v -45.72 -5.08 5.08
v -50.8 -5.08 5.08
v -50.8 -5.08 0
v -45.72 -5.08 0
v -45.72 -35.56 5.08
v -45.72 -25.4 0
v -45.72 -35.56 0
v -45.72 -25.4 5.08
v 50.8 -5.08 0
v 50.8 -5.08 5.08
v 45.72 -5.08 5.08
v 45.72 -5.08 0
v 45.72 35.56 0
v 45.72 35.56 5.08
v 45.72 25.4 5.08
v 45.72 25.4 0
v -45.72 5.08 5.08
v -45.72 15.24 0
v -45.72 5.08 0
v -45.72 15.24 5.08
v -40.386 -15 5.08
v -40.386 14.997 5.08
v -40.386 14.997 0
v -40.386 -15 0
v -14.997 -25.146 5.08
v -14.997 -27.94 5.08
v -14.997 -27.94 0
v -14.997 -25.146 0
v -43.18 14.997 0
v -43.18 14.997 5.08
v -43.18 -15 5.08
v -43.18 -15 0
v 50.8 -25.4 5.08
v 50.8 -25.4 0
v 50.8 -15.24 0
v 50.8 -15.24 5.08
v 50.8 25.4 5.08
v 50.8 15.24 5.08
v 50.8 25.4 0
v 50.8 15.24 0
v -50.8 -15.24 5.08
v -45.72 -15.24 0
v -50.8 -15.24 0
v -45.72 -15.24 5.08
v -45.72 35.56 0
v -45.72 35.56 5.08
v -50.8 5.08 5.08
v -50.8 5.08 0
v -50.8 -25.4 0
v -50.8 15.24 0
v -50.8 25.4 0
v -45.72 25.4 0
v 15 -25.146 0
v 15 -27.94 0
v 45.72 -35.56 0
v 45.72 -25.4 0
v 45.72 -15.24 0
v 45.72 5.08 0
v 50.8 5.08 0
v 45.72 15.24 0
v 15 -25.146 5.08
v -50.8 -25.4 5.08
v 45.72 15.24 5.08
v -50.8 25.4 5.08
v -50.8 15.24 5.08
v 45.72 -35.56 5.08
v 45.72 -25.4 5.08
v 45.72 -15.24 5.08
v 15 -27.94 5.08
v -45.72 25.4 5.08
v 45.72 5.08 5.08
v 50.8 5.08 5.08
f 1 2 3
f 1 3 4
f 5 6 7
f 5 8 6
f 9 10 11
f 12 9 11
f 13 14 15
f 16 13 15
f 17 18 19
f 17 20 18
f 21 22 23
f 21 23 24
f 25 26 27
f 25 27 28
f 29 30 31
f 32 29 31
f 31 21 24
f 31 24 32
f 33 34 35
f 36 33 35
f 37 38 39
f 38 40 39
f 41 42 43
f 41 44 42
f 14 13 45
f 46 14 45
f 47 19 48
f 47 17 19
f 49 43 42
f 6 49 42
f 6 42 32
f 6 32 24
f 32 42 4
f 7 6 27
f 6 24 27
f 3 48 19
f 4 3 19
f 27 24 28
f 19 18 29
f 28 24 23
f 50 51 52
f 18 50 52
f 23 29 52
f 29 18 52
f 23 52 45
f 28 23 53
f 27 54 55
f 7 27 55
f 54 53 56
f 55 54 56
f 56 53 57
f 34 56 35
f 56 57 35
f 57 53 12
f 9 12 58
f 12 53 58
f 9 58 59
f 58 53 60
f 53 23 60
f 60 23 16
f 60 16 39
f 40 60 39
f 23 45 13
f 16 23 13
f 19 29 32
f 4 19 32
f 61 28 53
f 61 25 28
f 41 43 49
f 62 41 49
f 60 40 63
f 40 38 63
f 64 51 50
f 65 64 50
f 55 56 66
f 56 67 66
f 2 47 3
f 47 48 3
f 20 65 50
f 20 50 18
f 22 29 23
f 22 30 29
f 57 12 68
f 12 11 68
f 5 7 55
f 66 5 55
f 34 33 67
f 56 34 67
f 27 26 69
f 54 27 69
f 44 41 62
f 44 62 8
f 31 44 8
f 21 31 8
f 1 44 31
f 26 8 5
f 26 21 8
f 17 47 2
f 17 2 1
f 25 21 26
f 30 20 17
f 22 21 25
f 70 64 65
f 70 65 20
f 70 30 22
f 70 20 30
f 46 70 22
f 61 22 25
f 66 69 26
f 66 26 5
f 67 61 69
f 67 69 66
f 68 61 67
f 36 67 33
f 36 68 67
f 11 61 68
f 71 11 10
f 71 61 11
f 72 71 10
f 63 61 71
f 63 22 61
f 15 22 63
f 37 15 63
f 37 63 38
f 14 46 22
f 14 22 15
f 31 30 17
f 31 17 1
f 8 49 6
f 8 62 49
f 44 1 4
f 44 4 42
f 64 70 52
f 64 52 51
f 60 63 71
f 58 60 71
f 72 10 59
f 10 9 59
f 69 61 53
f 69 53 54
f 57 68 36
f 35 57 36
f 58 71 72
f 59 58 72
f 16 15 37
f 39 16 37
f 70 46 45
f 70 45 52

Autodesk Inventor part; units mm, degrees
ref_plane "YZ Plane" through (0, 0, 0) normal (1, 0, 0) x (0, 1, 0)
ref_plane "XZ Plane" through (0, 0, 0) normal (0, 1, 0) x (-1, 0, 0)
ref_plane "XY Plane" through (0, 0, 0) normal (0, 0, 1) x (1, 0, 0)
sketch "Sketch1" plane through (0, 0, 0) normal (0, 0, 1) x (1, 0, 0)
  line L0 (-50.8, -35.56) -> (50.8, -35.56)
  line L1 (50.8, -35.56) -> (50.8, 35.56)
  line L2 (50.8, 35.56) -> (-50.8, 35.56)
  line L3 (-50.8, 35.56) -> (-50.8, -35.56)
  line L4 (-50.8, 35.56) -> (50.8, -35.56) construction
  line L5 (50.8, -35.56) -> (-50.8, -35.56) construction
  line L6 (50.8, 35.56) -> (-50.8, -35.56) construction
  point P0 (0, 0)
  point P1 (0, 0)
  dimension "d0" = 101.6
  dimension "d1" = 71.12
extrude "Extrusion1" add sketch "Sketch1" along normal blind 5.08
sketch "Sketch2" plane through (0, 0, 5.08) normal (0, 0, 1) x (1, 0, 0)
  line L0 (-43.18, 16.9024) -> (-43.18, -16.905) projected
  line L1 (-40.386, 16.9024) -> (-40.386, -16.905) projected
  line L2 (-16.9024, -27.94) -> (16.905, -27.94) projected
  line L3 (-16.9024, -25.146) -> (16.905, -25.146) projected
  line L4 (-40.386, -16.905) -> (-43.18, -16.905) projected
  line L5 (-43.18, 16.9024) -> (-40.386, 16.9024) projected
  line L6 (16.905, -25.146) -> (16.905, -27.94) projected
  line L7 (-16.9024, -27.94) -> (-16.9024, -25.146) projected
  point P0 (0, 0)
extrude "Extrusion2" cut sketch "Sketch2" against normal blind 5.08
sketch "Sketch3" plane through (0, 0, 5.08) normal (0, 0, 1) x (1, 0, 0)
  line L0 (-43.18, -16.905) -> (-43.18, 16.9024) projected
  line L1 (-40.386, 16.9024) -> (-40.386, -16.905) projected
  line L2 (16.905, -27.94) -> (-16.9024, -27.94) projected
  line L3 (-16.9024, -25.146) -> (16.905, -25.146) projected
  line L4 (50.8, -35.56) -> (50.8, 35.56) projected
  line L5 (50.8, 35.56) -> (-50.8, 35.56) projected
  line L6 (-50.8, 35.56) -> (-50.8, -35.56) projected
  line L7 (-50.8, -35.56) -> (50.8, -35.56) projected
  line L8 (50.8, -35.56) -> (50.8, 35.56) projected
  line L9 (50.8, 35.56) -> (45.72, 35.56)
  line L10 (45.72, 35.56) -> (45.72, 25.4)
  line L11 (45.72, 25.4) -> (50.8, 25.4)
  line L12 (50.8, 25.4) -> (50.8, 35.56)
  line L13 (0, 35.56) -> (0, -35.56) construction
  line L14 (45.72, 5.08) -> (50.8, 5.08)
  line L15 (45.72, 15.24) -> (45.72, 5.08)
  line L16 (50.8, 15.24) -> (45.72, 15.24)
  line L17 (50.8, 5.08) -> (50.8, 15.24)
  line L18 (45.72, -15.24) -> (50.8, -15.24)
  line L19 (45.72, -5.08) -> (45.72, -15.24)
  line L20 (50.8, -5.08) -> (45.72, -5.08)
  line L21 (50.8, -15.24) -> (50.8, -5.08)
  line L22 (45.72, -35.56) -> (50.8, -35.56)
  line L23 (45.72, -25.4) -> (45.72, -35.56)
  line L24 (50.8, -25.4) -> (45.72, -25.4)
  line L25 (50.8, -35.56) -> (50.8, -25.4)
  line L26 (-50.8, -35.56) -> (-50.8, 35.56)
  line L27 (-50.8, -35.56) -> (-50.8, 35.56)
  line L28 (-50.8, 35.56) -> (-45.72, 35.56)
  line L29 (-45.72, 35.56) -> (-45.72, 25.4)
  line L30 (-45.72, 25.4) -> (-50.8, 25.4)
  line L31 (-50.8, 25.4) -> (-50.8, 35.56)
  line L32 (-45.72, 5.08) -> (-50.8, 5.08)
  line L33 (-45.72, 15.24) -> (-45.72, 5.08)
  line L34 (-50.8, 15.24) -> (-45.72, 15.24)
  line L35 (-50.8, 5.08) -> (-50.8, 15.24)
  line L36 (-45.72, -15.24) -> (-50.8, -15.24)
  line L37 (-45.72, -5.08) -> (-45.72, -15.24)
  line L38 (-50.8, -5.08) -> (-45.72, -5.08)
  line L39 (-50.8, -15.24) -> (-50.8, -5.08)
  line L40 (-45.72, -35.56) -> (-50.8, -35.56)
  line L41 (-45.72, -25.4) -> (-45.72, -35.56)
  line L42 (-50.8, -25.4) -> (-45.72, -25.4)
  line L43 (-50.8, -35.56) -> (-50.8, -25.4)
  line L44 (-40.386, -16.905) -> (-43.18, -16.905) projected
  line L45 (-43.18, 16.9024) -> (-40.386, 16.9024) projected
  line L46 (16.905, -25.146) -> (16.905, -27.94) projected
  line L47 (-16.9024, -27.94) -> (-16.9024, -25.146) projected
  point P0 (0, 0)
  dimension "d6" = 10.16
  dimension "d7" = 5.08
  dimension "d8" = 0
  dimension "d11" = 20.32
  dimension "d16" = 20.32
extrude "Extrusion3" cut sketch "Sketch3" against normal blind 25.4 contours L0 L45 L1 L44 | L2 L47 L3 L46 | L24 L23 L7 L41 L42 L6 L36 L37 L38 L32 L33 L34 L30 L29 L5 L10 L11 L4 L16 L15 L14 L20 L19 L18 keep common part
sketch "Sketch4" plane through (0, 0, 5.08) normal (0, 0, 1) x (1, 0, 0)
  point P0 (0, 0)
sketch "Sketch5" plane through (0, 0, 5.08) normal (0, 0, 1) x (1, 0, 0)
  line L0 (-50.8, -15.24) -> (-45.72, -15.24) projected
  line L1 (-50.8, -15.24) -> (-50.8, -25.4) projected
  line L2 (-45.72, -25.4) -> (-50.8, -25.4) projected
  line L3 (-45.72, -35.56) -> (-45.72, -25.4) projected
  line L4 (-45.72, -35.56) -> (45.72, -35.56) projected
  line L5 (45.72, -25.4) -> (45.72, -35.56) projected
  line L6 (50.8, -25.4) -> (45.72, -25.4) projected
  line L7 (50.8, -25.4) -> (50.8, -15.24) projected
  line L8 (45.72, -15.24) -> (50.8, -15.24) projected
  line L9 (45.72, -5.08) -> (45.72, -15.24) projected
  line L10 (50.8, -5.08) -> (45.72, -5.08) projected
  line L11 (50.8, -5.08) -> (50.8, 5.08) projected
  line L12 (45.72, 5.08) -> (50.8, 5.08) projected
  line L13 (45.72, 15.24) -> (45.72, 5.08) projected
  line L14 (50.8, 15.24) -> (45.72, 15.24) projected
  line L15 (50.8, 15.24) -> (50.8, 25.4) projected
  line L16 (45.72, 25.4) -> (50.8, 25.4) projected
  line L17 (45.72, 35.56) -> (45.72, 25.4) projected
  line L18 (45.72, 35.56) -> (-45.72, 35.56) projected
  line L19 (-45.72, 25.4) -> (-45.72, 35.56) projected
  line L20 (-50.8, 25.4) -> (-45.72, 25.4) projected
  line L21 (-50.8, 25.4) -> (-50.8, 15.24) projected
  line L22 (-45.72, 15.24) -> (-50.8, 15.24) projected
  line L23 (-45.72, 5.08) -> (-45.72, 15.24) projected
  line L24 (-50.8, 5.08) -> (-45.72, 5.08) projected
  line L25 (-50.8, 5.08) -> (-50.8, -5.08) projected
  line L26 (-45.72, -5.08) -> (-50.8, -5.08) projected
  line L27 (-45.72, -15.24) -> (-45.72, -5.08) projected
  line L28 (-43.18, -16.905) -> (-43.18, 16.9024) projected
  line L29 (-40.386, 16.9024) -> (-40.386, -16.905) projected
  line L30 (16.905, -27.94) -> (-16.9024, -27.94) projected
  line L31 (-16.9024, -25.146) -> (16.905, -25.146) projected
  line L32 (-40.386, 20.0774) -> (-43.18, 20.0774)
  line L33 (-43.18, 20.0774) -> (-43.18, 14.9974)
  line L34 (-43.18, 14.9974) -> (-40.386, 14.9974)
  line L35 (-40.386, 14.9974) -> (-40.386, 20.0774)
  line L36 (-43.18, -20.08) -> (-40.386, -20.08)
  line L37 (-40.386, -20.08) -> (-40.386, -15)
  line L38 (-40.386, -15) -> (-43.18, -15)
  line L39 (-43.18, -15) -> (-43.18, -20.08)
  line L40 (-20.0774, -27.94) -> (-14.9974, -27.94)
  line L41 (-14.9974, -27.94) -> (-14.9974, -25.146)
  line L42 (-14.9974, -25.146) -> (-20.0774, -25.146)
  line L43 (-20.0774, -25.146) -> (-20.0774, -27.94)
  line L44 (20.08, -25.146) -> (15, -25.146)
  line L45 (15, -25.146) -> (15, -27.94)
  line L46 (15, -27.94) -> (20.08, -27.94)
  line L47 (20.08, -27.94) -> (20.08, -25.146)
  line L48 (-40.386, -16.905) -> (-43.18, -16.905) projected
  line L49 (-43.18, 16.9024) -> (-40.386, 16.9024) projected
  line L50 (16.905, -25.146) -> (16.905, -27.94) projected
  line L51 (-16.9024, -27.94) -> (-16.9024, -25.146) projected
  point P0 (0, 0)
  dimension "d19" = 5.08
  dimension "d20" = 5.08
  dimension "d21" = 5.08
  dimension "d22" = 5.08
extrude "Extrusion4" add sketch "Sketch5" against normal blind 5.08 contours L48 L37 L36 L39 | L28 L38 L29 L48 | L28 L49 L29 L34 | L33 L32 L35 L49 | L50 L44 L47 L46 | L30 L45 L31 L50 | L30 L51 L31 L41 | L40 L43 L42 L51
properties part number "PiShelf" material "Wood (Birch)"
